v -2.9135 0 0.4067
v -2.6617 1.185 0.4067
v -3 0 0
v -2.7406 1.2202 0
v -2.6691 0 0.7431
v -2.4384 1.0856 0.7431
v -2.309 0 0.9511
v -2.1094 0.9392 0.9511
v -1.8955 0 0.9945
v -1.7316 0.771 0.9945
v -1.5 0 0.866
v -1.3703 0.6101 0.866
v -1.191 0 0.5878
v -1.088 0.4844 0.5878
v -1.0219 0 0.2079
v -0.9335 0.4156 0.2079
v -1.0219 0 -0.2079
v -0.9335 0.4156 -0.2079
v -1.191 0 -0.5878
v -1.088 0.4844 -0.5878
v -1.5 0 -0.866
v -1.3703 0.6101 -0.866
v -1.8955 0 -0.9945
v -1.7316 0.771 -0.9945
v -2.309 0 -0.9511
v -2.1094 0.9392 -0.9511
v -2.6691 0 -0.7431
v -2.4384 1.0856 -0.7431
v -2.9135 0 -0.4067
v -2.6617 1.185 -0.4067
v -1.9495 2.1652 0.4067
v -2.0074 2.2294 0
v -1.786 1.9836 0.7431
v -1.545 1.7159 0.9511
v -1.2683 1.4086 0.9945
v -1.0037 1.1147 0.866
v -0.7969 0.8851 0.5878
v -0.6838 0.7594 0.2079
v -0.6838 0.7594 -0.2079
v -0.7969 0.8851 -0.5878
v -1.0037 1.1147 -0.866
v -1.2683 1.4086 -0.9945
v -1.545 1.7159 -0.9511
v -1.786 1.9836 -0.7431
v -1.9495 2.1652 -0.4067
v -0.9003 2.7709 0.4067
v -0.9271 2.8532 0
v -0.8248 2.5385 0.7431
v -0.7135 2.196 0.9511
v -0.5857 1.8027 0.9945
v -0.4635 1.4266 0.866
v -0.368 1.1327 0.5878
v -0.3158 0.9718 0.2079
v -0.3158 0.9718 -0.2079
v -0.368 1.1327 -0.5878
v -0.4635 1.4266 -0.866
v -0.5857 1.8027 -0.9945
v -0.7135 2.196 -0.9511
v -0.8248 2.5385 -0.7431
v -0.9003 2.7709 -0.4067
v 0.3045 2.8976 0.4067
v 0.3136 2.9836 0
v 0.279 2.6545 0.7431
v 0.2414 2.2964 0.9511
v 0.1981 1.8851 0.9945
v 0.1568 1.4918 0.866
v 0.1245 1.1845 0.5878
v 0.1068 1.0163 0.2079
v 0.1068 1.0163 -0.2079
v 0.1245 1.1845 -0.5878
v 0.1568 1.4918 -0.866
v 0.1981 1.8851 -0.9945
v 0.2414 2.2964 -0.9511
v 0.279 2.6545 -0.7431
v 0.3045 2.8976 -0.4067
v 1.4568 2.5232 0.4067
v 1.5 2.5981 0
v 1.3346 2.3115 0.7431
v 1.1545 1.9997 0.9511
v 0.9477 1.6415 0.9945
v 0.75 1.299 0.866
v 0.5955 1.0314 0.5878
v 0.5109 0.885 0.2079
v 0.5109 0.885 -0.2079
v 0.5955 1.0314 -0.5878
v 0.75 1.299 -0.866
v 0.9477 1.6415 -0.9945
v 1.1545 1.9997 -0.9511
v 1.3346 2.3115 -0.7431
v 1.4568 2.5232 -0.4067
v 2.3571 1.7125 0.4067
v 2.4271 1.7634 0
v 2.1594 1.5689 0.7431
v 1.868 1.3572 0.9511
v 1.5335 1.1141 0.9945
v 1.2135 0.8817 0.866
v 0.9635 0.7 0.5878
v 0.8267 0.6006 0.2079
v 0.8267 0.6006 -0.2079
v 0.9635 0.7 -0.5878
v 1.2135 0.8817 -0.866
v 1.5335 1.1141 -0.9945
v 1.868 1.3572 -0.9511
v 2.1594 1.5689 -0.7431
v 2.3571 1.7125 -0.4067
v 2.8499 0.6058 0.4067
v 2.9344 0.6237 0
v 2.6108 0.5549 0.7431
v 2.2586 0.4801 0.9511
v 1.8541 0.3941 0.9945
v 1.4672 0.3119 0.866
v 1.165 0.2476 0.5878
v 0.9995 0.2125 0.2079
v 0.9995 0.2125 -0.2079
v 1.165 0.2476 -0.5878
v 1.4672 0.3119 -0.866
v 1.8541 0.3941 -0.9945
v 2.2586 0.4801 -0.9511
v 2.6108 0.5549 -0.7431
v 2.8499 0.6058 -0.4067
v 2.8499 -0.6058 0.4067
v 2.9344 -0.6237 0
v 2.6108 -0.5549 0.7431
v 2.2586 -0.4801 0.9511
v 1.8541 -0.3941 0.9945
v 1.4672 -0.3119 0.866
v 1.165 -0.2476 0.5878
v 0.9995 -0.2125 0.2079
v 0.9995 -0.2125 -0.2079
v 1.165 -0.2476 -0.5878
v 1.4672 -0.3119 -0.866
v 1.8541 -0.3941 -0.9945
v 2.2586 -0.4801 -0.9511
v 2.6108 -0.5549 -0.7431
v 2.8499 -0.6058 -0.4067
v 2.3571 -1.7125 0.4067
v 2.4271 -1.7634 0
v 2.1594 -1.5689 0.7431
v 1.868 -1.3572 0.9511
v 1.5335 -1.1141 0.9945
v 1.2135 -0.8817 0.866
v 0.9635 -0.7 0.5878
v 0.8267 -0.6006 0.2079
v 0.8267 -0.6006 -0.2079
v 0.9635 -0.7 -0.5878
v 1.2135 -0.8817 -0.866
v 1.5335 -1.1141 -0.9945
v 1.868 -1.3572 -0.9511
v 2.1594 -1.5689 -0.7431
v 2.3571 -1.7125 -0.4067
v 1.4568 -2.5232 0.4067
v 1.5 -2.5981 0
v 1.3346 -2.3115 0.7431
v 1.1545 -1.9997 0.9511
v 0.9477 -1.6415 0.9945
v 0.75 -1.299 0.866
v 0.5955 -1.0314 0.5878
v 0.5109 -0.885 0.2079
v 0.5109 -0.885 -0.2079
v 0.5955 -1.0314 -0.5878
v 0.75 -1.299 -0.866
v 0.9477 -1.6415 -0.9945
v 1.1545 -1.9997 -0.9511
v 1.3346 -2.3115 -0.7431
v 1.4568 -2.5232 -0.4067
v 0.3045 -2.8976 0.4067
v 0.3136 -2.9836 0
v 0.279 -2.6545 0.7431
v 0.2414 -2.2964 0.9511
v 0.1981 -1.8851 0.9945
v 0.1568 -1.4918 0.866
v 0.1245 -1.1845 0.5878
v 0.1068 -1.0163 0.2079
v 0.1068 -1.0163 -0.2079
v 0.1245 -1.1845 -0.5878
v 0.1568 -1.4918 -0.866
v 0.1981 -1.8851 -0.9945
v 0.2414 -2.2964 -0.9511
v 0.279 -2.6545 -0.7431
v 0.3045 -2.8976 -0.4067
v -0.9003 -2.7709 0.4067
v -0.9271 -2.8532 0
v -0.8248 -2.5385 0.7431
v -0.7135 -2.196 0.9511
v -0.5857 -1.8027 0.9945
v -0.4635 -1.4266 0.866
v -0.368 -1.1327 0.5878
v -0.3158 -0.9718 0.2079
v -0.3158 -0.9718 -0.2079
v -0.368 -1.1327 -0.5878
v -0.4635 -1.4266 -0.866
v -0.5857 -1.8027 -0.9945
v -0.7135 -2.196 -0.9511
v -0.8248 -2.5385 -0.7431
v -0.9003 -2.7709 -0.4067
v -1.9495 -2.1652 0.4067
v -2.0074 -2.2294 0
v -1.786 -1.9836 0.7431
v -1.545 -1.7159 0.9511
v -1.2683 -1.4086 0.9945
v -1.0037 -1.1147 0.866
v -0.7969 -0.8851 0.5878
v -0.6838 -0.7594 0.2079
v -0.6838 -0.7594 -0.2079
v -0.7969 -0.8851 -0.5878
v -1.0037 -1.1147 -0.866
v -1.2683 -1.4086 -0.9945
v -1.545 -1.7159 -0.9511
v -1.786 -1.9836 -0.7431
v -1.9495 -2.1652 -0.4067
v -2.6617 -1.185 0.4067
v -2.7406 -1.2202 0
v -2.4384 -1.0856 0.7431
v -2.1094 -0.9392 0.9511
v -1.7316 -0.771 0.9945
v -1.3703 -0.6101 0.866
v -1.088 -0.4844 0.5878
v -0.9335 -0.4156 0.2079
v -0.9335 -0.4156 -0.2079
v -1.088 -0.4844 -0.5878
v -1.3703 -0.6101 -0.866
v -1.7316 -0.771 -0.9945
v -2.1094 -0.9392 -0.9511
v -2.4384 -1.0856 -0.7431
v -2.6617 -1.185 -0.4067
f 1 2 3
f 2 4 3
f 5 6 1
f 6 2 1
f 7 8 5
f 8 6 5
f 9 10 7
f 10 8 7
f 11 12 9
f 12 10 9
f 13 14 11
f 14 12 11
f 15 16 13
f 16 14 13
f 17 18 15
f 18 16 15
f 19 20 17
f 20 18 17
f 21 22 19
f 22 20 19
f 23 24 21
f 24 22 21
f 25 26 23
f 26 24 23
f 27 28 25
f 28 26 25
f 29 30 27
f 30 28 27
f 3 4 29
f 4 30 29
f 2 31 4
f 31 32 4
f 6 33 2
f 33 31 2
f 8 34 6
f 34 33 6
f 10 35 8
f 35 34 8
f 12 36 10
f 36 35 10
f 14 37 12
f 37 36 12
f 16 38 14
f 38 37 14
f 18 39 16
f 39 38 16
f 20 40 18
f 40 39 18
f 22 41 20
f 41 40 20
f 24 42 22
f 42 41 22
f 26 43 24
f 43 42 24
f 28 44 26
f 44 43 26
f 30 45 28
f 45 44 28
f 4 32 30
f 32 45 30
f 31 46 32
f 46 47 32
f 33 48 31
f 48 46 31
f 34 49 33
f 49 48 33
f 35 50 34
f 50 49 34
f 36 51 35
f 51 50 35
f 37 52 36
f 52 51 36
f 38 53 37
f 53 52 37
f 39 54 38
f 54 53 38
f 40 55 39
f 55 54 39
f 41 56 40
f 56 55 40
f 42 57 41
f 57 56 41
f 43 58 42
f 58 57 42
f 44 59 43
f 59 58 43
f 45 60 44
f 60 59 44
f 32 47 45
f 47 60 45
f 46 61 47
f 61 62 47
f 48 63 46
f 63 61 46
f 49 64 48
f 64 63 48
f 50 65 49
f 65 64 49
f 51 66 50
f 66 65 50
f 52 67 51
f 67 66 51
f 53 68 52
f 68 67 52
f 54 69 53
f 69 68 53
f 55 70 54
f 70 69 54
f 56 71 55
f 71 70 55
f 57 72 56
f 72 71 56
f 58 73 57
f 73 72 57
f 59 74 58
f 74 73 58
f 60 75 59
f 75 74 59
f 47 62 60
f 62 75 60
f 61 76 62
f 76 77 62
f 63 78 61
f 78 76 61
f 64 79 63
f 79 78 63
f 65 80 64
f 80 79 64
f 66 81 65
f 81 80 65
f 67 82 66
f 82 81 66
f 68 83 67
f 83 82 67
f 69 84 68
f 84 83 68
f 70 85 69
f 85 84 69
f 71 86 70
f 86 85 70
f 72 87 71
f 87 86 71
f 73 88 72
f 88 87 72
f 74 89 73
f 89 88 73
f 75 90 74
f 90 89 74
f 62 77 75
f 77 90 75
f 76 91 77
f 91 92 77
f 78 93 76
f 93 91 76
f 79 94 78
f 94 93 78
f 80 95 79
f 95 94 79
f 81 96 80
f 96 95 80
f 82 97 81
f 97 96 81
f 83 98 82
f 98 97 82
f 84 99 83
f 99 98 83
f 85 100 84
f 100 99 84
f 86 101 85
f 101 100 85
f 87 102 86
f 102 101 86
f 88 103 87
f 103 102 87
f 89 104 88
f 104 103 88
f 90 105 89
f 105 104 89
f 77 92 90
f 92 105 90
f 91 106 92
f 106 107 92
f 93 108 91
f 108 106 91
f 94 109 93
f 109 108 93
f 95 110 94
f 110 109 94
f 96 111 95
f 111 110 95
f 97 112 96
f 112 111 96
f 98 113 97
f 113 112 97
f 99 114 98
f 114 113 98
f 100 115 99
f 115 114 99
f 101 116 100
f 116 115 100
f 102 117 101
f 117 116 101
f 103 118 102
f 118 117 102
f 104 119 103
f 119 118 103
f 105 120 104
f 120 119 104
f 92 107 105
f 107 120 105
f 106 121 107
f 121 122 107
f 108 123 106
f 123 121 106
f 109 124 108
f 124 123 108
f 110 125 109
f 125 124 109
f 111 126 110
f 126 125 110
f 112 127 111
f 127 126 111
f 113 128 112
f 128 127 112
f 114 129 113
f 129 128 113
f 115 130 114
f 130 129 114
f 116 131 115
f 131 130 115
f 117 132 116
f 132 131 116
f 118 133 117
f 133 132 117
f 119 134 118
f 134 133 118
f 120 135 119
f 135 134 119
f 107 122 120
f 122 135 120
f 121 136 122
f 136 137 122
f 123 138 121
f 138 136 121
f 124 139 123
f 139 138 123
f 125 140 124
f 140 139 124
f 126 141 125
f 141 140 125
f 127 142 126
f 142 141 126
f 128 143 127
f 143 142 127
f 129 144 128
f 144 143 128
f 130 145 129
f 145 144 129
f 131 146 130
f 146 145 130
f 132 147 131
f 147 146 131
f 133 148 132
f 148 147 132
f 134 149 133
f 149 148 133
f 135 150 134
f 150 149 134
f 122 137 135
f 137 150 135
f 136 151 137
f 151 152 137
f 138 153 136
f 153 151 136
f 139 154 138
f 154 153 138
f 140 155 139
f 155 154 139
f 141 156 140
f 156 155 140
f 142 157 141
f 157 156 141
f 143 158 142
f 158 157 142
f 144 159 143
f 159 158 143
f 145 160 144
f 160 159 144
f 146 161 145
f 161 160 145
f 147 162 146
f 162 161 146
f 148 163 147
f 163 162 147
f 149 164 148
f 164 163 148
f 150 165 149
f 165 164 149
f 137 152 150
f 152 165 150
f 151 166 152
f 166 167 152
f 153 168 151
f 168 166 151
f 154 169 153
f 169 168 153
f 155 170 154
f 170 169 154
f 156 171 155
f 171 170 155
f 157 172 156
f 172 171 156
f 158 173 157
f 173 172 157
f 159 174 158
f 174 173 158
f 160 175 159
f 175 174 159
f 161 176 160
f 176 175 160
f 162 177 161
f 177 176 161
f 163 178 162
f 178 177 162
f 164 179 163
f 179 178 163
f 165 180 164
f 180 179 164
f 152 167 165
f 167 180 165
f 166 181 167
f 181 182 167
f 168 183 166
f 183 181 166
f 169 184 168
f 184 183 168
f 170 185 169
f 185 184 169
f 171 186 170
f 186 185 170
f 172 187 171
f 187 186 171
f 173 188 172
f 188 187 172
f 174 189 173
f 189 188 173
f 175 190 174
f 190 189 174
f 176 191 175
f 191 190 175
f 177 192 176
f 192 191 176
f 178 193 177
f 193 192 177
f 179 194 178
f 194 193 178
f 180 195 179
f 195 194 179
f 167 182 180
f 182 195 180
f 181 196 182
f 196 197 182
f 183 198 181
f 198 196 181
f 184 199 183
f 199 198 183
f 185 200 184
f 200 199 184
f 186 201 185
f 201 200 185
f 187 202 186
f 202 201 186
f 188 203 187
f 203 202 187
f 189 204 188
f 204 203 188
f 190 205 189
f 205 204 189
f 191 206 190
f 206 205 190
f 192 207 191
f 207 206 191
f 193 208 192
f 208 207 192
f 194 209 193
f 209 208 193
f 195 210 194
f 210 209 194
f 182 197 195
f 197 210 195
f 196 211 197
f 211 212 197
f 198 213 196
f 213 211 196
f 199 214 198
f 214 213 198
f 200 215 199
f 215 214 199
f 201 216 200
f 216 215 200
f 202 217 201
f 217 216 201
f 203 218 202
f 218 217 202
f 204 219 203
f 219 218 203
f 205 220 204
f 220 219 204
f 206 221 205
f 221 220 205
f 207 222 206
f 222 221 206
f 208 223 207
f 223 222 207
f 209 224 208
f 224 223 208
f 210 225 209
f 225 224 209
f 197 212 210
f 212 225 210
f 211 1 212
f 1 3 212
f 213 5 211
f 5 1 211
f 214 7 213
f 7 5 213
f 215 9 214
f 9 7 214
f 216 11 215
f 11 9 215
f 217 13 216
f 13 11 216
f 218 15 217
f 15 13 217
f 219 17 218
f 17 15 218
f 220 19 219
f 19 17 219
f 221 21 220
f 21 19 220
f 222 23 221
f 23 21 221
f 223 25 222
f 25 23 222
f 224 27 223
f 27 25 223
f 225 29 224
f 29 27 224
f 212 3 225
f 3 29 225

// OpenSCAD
$fn=15;
rotate_extrude(convexity = 10)
translate([2,0,0])
circle(r = 1);
